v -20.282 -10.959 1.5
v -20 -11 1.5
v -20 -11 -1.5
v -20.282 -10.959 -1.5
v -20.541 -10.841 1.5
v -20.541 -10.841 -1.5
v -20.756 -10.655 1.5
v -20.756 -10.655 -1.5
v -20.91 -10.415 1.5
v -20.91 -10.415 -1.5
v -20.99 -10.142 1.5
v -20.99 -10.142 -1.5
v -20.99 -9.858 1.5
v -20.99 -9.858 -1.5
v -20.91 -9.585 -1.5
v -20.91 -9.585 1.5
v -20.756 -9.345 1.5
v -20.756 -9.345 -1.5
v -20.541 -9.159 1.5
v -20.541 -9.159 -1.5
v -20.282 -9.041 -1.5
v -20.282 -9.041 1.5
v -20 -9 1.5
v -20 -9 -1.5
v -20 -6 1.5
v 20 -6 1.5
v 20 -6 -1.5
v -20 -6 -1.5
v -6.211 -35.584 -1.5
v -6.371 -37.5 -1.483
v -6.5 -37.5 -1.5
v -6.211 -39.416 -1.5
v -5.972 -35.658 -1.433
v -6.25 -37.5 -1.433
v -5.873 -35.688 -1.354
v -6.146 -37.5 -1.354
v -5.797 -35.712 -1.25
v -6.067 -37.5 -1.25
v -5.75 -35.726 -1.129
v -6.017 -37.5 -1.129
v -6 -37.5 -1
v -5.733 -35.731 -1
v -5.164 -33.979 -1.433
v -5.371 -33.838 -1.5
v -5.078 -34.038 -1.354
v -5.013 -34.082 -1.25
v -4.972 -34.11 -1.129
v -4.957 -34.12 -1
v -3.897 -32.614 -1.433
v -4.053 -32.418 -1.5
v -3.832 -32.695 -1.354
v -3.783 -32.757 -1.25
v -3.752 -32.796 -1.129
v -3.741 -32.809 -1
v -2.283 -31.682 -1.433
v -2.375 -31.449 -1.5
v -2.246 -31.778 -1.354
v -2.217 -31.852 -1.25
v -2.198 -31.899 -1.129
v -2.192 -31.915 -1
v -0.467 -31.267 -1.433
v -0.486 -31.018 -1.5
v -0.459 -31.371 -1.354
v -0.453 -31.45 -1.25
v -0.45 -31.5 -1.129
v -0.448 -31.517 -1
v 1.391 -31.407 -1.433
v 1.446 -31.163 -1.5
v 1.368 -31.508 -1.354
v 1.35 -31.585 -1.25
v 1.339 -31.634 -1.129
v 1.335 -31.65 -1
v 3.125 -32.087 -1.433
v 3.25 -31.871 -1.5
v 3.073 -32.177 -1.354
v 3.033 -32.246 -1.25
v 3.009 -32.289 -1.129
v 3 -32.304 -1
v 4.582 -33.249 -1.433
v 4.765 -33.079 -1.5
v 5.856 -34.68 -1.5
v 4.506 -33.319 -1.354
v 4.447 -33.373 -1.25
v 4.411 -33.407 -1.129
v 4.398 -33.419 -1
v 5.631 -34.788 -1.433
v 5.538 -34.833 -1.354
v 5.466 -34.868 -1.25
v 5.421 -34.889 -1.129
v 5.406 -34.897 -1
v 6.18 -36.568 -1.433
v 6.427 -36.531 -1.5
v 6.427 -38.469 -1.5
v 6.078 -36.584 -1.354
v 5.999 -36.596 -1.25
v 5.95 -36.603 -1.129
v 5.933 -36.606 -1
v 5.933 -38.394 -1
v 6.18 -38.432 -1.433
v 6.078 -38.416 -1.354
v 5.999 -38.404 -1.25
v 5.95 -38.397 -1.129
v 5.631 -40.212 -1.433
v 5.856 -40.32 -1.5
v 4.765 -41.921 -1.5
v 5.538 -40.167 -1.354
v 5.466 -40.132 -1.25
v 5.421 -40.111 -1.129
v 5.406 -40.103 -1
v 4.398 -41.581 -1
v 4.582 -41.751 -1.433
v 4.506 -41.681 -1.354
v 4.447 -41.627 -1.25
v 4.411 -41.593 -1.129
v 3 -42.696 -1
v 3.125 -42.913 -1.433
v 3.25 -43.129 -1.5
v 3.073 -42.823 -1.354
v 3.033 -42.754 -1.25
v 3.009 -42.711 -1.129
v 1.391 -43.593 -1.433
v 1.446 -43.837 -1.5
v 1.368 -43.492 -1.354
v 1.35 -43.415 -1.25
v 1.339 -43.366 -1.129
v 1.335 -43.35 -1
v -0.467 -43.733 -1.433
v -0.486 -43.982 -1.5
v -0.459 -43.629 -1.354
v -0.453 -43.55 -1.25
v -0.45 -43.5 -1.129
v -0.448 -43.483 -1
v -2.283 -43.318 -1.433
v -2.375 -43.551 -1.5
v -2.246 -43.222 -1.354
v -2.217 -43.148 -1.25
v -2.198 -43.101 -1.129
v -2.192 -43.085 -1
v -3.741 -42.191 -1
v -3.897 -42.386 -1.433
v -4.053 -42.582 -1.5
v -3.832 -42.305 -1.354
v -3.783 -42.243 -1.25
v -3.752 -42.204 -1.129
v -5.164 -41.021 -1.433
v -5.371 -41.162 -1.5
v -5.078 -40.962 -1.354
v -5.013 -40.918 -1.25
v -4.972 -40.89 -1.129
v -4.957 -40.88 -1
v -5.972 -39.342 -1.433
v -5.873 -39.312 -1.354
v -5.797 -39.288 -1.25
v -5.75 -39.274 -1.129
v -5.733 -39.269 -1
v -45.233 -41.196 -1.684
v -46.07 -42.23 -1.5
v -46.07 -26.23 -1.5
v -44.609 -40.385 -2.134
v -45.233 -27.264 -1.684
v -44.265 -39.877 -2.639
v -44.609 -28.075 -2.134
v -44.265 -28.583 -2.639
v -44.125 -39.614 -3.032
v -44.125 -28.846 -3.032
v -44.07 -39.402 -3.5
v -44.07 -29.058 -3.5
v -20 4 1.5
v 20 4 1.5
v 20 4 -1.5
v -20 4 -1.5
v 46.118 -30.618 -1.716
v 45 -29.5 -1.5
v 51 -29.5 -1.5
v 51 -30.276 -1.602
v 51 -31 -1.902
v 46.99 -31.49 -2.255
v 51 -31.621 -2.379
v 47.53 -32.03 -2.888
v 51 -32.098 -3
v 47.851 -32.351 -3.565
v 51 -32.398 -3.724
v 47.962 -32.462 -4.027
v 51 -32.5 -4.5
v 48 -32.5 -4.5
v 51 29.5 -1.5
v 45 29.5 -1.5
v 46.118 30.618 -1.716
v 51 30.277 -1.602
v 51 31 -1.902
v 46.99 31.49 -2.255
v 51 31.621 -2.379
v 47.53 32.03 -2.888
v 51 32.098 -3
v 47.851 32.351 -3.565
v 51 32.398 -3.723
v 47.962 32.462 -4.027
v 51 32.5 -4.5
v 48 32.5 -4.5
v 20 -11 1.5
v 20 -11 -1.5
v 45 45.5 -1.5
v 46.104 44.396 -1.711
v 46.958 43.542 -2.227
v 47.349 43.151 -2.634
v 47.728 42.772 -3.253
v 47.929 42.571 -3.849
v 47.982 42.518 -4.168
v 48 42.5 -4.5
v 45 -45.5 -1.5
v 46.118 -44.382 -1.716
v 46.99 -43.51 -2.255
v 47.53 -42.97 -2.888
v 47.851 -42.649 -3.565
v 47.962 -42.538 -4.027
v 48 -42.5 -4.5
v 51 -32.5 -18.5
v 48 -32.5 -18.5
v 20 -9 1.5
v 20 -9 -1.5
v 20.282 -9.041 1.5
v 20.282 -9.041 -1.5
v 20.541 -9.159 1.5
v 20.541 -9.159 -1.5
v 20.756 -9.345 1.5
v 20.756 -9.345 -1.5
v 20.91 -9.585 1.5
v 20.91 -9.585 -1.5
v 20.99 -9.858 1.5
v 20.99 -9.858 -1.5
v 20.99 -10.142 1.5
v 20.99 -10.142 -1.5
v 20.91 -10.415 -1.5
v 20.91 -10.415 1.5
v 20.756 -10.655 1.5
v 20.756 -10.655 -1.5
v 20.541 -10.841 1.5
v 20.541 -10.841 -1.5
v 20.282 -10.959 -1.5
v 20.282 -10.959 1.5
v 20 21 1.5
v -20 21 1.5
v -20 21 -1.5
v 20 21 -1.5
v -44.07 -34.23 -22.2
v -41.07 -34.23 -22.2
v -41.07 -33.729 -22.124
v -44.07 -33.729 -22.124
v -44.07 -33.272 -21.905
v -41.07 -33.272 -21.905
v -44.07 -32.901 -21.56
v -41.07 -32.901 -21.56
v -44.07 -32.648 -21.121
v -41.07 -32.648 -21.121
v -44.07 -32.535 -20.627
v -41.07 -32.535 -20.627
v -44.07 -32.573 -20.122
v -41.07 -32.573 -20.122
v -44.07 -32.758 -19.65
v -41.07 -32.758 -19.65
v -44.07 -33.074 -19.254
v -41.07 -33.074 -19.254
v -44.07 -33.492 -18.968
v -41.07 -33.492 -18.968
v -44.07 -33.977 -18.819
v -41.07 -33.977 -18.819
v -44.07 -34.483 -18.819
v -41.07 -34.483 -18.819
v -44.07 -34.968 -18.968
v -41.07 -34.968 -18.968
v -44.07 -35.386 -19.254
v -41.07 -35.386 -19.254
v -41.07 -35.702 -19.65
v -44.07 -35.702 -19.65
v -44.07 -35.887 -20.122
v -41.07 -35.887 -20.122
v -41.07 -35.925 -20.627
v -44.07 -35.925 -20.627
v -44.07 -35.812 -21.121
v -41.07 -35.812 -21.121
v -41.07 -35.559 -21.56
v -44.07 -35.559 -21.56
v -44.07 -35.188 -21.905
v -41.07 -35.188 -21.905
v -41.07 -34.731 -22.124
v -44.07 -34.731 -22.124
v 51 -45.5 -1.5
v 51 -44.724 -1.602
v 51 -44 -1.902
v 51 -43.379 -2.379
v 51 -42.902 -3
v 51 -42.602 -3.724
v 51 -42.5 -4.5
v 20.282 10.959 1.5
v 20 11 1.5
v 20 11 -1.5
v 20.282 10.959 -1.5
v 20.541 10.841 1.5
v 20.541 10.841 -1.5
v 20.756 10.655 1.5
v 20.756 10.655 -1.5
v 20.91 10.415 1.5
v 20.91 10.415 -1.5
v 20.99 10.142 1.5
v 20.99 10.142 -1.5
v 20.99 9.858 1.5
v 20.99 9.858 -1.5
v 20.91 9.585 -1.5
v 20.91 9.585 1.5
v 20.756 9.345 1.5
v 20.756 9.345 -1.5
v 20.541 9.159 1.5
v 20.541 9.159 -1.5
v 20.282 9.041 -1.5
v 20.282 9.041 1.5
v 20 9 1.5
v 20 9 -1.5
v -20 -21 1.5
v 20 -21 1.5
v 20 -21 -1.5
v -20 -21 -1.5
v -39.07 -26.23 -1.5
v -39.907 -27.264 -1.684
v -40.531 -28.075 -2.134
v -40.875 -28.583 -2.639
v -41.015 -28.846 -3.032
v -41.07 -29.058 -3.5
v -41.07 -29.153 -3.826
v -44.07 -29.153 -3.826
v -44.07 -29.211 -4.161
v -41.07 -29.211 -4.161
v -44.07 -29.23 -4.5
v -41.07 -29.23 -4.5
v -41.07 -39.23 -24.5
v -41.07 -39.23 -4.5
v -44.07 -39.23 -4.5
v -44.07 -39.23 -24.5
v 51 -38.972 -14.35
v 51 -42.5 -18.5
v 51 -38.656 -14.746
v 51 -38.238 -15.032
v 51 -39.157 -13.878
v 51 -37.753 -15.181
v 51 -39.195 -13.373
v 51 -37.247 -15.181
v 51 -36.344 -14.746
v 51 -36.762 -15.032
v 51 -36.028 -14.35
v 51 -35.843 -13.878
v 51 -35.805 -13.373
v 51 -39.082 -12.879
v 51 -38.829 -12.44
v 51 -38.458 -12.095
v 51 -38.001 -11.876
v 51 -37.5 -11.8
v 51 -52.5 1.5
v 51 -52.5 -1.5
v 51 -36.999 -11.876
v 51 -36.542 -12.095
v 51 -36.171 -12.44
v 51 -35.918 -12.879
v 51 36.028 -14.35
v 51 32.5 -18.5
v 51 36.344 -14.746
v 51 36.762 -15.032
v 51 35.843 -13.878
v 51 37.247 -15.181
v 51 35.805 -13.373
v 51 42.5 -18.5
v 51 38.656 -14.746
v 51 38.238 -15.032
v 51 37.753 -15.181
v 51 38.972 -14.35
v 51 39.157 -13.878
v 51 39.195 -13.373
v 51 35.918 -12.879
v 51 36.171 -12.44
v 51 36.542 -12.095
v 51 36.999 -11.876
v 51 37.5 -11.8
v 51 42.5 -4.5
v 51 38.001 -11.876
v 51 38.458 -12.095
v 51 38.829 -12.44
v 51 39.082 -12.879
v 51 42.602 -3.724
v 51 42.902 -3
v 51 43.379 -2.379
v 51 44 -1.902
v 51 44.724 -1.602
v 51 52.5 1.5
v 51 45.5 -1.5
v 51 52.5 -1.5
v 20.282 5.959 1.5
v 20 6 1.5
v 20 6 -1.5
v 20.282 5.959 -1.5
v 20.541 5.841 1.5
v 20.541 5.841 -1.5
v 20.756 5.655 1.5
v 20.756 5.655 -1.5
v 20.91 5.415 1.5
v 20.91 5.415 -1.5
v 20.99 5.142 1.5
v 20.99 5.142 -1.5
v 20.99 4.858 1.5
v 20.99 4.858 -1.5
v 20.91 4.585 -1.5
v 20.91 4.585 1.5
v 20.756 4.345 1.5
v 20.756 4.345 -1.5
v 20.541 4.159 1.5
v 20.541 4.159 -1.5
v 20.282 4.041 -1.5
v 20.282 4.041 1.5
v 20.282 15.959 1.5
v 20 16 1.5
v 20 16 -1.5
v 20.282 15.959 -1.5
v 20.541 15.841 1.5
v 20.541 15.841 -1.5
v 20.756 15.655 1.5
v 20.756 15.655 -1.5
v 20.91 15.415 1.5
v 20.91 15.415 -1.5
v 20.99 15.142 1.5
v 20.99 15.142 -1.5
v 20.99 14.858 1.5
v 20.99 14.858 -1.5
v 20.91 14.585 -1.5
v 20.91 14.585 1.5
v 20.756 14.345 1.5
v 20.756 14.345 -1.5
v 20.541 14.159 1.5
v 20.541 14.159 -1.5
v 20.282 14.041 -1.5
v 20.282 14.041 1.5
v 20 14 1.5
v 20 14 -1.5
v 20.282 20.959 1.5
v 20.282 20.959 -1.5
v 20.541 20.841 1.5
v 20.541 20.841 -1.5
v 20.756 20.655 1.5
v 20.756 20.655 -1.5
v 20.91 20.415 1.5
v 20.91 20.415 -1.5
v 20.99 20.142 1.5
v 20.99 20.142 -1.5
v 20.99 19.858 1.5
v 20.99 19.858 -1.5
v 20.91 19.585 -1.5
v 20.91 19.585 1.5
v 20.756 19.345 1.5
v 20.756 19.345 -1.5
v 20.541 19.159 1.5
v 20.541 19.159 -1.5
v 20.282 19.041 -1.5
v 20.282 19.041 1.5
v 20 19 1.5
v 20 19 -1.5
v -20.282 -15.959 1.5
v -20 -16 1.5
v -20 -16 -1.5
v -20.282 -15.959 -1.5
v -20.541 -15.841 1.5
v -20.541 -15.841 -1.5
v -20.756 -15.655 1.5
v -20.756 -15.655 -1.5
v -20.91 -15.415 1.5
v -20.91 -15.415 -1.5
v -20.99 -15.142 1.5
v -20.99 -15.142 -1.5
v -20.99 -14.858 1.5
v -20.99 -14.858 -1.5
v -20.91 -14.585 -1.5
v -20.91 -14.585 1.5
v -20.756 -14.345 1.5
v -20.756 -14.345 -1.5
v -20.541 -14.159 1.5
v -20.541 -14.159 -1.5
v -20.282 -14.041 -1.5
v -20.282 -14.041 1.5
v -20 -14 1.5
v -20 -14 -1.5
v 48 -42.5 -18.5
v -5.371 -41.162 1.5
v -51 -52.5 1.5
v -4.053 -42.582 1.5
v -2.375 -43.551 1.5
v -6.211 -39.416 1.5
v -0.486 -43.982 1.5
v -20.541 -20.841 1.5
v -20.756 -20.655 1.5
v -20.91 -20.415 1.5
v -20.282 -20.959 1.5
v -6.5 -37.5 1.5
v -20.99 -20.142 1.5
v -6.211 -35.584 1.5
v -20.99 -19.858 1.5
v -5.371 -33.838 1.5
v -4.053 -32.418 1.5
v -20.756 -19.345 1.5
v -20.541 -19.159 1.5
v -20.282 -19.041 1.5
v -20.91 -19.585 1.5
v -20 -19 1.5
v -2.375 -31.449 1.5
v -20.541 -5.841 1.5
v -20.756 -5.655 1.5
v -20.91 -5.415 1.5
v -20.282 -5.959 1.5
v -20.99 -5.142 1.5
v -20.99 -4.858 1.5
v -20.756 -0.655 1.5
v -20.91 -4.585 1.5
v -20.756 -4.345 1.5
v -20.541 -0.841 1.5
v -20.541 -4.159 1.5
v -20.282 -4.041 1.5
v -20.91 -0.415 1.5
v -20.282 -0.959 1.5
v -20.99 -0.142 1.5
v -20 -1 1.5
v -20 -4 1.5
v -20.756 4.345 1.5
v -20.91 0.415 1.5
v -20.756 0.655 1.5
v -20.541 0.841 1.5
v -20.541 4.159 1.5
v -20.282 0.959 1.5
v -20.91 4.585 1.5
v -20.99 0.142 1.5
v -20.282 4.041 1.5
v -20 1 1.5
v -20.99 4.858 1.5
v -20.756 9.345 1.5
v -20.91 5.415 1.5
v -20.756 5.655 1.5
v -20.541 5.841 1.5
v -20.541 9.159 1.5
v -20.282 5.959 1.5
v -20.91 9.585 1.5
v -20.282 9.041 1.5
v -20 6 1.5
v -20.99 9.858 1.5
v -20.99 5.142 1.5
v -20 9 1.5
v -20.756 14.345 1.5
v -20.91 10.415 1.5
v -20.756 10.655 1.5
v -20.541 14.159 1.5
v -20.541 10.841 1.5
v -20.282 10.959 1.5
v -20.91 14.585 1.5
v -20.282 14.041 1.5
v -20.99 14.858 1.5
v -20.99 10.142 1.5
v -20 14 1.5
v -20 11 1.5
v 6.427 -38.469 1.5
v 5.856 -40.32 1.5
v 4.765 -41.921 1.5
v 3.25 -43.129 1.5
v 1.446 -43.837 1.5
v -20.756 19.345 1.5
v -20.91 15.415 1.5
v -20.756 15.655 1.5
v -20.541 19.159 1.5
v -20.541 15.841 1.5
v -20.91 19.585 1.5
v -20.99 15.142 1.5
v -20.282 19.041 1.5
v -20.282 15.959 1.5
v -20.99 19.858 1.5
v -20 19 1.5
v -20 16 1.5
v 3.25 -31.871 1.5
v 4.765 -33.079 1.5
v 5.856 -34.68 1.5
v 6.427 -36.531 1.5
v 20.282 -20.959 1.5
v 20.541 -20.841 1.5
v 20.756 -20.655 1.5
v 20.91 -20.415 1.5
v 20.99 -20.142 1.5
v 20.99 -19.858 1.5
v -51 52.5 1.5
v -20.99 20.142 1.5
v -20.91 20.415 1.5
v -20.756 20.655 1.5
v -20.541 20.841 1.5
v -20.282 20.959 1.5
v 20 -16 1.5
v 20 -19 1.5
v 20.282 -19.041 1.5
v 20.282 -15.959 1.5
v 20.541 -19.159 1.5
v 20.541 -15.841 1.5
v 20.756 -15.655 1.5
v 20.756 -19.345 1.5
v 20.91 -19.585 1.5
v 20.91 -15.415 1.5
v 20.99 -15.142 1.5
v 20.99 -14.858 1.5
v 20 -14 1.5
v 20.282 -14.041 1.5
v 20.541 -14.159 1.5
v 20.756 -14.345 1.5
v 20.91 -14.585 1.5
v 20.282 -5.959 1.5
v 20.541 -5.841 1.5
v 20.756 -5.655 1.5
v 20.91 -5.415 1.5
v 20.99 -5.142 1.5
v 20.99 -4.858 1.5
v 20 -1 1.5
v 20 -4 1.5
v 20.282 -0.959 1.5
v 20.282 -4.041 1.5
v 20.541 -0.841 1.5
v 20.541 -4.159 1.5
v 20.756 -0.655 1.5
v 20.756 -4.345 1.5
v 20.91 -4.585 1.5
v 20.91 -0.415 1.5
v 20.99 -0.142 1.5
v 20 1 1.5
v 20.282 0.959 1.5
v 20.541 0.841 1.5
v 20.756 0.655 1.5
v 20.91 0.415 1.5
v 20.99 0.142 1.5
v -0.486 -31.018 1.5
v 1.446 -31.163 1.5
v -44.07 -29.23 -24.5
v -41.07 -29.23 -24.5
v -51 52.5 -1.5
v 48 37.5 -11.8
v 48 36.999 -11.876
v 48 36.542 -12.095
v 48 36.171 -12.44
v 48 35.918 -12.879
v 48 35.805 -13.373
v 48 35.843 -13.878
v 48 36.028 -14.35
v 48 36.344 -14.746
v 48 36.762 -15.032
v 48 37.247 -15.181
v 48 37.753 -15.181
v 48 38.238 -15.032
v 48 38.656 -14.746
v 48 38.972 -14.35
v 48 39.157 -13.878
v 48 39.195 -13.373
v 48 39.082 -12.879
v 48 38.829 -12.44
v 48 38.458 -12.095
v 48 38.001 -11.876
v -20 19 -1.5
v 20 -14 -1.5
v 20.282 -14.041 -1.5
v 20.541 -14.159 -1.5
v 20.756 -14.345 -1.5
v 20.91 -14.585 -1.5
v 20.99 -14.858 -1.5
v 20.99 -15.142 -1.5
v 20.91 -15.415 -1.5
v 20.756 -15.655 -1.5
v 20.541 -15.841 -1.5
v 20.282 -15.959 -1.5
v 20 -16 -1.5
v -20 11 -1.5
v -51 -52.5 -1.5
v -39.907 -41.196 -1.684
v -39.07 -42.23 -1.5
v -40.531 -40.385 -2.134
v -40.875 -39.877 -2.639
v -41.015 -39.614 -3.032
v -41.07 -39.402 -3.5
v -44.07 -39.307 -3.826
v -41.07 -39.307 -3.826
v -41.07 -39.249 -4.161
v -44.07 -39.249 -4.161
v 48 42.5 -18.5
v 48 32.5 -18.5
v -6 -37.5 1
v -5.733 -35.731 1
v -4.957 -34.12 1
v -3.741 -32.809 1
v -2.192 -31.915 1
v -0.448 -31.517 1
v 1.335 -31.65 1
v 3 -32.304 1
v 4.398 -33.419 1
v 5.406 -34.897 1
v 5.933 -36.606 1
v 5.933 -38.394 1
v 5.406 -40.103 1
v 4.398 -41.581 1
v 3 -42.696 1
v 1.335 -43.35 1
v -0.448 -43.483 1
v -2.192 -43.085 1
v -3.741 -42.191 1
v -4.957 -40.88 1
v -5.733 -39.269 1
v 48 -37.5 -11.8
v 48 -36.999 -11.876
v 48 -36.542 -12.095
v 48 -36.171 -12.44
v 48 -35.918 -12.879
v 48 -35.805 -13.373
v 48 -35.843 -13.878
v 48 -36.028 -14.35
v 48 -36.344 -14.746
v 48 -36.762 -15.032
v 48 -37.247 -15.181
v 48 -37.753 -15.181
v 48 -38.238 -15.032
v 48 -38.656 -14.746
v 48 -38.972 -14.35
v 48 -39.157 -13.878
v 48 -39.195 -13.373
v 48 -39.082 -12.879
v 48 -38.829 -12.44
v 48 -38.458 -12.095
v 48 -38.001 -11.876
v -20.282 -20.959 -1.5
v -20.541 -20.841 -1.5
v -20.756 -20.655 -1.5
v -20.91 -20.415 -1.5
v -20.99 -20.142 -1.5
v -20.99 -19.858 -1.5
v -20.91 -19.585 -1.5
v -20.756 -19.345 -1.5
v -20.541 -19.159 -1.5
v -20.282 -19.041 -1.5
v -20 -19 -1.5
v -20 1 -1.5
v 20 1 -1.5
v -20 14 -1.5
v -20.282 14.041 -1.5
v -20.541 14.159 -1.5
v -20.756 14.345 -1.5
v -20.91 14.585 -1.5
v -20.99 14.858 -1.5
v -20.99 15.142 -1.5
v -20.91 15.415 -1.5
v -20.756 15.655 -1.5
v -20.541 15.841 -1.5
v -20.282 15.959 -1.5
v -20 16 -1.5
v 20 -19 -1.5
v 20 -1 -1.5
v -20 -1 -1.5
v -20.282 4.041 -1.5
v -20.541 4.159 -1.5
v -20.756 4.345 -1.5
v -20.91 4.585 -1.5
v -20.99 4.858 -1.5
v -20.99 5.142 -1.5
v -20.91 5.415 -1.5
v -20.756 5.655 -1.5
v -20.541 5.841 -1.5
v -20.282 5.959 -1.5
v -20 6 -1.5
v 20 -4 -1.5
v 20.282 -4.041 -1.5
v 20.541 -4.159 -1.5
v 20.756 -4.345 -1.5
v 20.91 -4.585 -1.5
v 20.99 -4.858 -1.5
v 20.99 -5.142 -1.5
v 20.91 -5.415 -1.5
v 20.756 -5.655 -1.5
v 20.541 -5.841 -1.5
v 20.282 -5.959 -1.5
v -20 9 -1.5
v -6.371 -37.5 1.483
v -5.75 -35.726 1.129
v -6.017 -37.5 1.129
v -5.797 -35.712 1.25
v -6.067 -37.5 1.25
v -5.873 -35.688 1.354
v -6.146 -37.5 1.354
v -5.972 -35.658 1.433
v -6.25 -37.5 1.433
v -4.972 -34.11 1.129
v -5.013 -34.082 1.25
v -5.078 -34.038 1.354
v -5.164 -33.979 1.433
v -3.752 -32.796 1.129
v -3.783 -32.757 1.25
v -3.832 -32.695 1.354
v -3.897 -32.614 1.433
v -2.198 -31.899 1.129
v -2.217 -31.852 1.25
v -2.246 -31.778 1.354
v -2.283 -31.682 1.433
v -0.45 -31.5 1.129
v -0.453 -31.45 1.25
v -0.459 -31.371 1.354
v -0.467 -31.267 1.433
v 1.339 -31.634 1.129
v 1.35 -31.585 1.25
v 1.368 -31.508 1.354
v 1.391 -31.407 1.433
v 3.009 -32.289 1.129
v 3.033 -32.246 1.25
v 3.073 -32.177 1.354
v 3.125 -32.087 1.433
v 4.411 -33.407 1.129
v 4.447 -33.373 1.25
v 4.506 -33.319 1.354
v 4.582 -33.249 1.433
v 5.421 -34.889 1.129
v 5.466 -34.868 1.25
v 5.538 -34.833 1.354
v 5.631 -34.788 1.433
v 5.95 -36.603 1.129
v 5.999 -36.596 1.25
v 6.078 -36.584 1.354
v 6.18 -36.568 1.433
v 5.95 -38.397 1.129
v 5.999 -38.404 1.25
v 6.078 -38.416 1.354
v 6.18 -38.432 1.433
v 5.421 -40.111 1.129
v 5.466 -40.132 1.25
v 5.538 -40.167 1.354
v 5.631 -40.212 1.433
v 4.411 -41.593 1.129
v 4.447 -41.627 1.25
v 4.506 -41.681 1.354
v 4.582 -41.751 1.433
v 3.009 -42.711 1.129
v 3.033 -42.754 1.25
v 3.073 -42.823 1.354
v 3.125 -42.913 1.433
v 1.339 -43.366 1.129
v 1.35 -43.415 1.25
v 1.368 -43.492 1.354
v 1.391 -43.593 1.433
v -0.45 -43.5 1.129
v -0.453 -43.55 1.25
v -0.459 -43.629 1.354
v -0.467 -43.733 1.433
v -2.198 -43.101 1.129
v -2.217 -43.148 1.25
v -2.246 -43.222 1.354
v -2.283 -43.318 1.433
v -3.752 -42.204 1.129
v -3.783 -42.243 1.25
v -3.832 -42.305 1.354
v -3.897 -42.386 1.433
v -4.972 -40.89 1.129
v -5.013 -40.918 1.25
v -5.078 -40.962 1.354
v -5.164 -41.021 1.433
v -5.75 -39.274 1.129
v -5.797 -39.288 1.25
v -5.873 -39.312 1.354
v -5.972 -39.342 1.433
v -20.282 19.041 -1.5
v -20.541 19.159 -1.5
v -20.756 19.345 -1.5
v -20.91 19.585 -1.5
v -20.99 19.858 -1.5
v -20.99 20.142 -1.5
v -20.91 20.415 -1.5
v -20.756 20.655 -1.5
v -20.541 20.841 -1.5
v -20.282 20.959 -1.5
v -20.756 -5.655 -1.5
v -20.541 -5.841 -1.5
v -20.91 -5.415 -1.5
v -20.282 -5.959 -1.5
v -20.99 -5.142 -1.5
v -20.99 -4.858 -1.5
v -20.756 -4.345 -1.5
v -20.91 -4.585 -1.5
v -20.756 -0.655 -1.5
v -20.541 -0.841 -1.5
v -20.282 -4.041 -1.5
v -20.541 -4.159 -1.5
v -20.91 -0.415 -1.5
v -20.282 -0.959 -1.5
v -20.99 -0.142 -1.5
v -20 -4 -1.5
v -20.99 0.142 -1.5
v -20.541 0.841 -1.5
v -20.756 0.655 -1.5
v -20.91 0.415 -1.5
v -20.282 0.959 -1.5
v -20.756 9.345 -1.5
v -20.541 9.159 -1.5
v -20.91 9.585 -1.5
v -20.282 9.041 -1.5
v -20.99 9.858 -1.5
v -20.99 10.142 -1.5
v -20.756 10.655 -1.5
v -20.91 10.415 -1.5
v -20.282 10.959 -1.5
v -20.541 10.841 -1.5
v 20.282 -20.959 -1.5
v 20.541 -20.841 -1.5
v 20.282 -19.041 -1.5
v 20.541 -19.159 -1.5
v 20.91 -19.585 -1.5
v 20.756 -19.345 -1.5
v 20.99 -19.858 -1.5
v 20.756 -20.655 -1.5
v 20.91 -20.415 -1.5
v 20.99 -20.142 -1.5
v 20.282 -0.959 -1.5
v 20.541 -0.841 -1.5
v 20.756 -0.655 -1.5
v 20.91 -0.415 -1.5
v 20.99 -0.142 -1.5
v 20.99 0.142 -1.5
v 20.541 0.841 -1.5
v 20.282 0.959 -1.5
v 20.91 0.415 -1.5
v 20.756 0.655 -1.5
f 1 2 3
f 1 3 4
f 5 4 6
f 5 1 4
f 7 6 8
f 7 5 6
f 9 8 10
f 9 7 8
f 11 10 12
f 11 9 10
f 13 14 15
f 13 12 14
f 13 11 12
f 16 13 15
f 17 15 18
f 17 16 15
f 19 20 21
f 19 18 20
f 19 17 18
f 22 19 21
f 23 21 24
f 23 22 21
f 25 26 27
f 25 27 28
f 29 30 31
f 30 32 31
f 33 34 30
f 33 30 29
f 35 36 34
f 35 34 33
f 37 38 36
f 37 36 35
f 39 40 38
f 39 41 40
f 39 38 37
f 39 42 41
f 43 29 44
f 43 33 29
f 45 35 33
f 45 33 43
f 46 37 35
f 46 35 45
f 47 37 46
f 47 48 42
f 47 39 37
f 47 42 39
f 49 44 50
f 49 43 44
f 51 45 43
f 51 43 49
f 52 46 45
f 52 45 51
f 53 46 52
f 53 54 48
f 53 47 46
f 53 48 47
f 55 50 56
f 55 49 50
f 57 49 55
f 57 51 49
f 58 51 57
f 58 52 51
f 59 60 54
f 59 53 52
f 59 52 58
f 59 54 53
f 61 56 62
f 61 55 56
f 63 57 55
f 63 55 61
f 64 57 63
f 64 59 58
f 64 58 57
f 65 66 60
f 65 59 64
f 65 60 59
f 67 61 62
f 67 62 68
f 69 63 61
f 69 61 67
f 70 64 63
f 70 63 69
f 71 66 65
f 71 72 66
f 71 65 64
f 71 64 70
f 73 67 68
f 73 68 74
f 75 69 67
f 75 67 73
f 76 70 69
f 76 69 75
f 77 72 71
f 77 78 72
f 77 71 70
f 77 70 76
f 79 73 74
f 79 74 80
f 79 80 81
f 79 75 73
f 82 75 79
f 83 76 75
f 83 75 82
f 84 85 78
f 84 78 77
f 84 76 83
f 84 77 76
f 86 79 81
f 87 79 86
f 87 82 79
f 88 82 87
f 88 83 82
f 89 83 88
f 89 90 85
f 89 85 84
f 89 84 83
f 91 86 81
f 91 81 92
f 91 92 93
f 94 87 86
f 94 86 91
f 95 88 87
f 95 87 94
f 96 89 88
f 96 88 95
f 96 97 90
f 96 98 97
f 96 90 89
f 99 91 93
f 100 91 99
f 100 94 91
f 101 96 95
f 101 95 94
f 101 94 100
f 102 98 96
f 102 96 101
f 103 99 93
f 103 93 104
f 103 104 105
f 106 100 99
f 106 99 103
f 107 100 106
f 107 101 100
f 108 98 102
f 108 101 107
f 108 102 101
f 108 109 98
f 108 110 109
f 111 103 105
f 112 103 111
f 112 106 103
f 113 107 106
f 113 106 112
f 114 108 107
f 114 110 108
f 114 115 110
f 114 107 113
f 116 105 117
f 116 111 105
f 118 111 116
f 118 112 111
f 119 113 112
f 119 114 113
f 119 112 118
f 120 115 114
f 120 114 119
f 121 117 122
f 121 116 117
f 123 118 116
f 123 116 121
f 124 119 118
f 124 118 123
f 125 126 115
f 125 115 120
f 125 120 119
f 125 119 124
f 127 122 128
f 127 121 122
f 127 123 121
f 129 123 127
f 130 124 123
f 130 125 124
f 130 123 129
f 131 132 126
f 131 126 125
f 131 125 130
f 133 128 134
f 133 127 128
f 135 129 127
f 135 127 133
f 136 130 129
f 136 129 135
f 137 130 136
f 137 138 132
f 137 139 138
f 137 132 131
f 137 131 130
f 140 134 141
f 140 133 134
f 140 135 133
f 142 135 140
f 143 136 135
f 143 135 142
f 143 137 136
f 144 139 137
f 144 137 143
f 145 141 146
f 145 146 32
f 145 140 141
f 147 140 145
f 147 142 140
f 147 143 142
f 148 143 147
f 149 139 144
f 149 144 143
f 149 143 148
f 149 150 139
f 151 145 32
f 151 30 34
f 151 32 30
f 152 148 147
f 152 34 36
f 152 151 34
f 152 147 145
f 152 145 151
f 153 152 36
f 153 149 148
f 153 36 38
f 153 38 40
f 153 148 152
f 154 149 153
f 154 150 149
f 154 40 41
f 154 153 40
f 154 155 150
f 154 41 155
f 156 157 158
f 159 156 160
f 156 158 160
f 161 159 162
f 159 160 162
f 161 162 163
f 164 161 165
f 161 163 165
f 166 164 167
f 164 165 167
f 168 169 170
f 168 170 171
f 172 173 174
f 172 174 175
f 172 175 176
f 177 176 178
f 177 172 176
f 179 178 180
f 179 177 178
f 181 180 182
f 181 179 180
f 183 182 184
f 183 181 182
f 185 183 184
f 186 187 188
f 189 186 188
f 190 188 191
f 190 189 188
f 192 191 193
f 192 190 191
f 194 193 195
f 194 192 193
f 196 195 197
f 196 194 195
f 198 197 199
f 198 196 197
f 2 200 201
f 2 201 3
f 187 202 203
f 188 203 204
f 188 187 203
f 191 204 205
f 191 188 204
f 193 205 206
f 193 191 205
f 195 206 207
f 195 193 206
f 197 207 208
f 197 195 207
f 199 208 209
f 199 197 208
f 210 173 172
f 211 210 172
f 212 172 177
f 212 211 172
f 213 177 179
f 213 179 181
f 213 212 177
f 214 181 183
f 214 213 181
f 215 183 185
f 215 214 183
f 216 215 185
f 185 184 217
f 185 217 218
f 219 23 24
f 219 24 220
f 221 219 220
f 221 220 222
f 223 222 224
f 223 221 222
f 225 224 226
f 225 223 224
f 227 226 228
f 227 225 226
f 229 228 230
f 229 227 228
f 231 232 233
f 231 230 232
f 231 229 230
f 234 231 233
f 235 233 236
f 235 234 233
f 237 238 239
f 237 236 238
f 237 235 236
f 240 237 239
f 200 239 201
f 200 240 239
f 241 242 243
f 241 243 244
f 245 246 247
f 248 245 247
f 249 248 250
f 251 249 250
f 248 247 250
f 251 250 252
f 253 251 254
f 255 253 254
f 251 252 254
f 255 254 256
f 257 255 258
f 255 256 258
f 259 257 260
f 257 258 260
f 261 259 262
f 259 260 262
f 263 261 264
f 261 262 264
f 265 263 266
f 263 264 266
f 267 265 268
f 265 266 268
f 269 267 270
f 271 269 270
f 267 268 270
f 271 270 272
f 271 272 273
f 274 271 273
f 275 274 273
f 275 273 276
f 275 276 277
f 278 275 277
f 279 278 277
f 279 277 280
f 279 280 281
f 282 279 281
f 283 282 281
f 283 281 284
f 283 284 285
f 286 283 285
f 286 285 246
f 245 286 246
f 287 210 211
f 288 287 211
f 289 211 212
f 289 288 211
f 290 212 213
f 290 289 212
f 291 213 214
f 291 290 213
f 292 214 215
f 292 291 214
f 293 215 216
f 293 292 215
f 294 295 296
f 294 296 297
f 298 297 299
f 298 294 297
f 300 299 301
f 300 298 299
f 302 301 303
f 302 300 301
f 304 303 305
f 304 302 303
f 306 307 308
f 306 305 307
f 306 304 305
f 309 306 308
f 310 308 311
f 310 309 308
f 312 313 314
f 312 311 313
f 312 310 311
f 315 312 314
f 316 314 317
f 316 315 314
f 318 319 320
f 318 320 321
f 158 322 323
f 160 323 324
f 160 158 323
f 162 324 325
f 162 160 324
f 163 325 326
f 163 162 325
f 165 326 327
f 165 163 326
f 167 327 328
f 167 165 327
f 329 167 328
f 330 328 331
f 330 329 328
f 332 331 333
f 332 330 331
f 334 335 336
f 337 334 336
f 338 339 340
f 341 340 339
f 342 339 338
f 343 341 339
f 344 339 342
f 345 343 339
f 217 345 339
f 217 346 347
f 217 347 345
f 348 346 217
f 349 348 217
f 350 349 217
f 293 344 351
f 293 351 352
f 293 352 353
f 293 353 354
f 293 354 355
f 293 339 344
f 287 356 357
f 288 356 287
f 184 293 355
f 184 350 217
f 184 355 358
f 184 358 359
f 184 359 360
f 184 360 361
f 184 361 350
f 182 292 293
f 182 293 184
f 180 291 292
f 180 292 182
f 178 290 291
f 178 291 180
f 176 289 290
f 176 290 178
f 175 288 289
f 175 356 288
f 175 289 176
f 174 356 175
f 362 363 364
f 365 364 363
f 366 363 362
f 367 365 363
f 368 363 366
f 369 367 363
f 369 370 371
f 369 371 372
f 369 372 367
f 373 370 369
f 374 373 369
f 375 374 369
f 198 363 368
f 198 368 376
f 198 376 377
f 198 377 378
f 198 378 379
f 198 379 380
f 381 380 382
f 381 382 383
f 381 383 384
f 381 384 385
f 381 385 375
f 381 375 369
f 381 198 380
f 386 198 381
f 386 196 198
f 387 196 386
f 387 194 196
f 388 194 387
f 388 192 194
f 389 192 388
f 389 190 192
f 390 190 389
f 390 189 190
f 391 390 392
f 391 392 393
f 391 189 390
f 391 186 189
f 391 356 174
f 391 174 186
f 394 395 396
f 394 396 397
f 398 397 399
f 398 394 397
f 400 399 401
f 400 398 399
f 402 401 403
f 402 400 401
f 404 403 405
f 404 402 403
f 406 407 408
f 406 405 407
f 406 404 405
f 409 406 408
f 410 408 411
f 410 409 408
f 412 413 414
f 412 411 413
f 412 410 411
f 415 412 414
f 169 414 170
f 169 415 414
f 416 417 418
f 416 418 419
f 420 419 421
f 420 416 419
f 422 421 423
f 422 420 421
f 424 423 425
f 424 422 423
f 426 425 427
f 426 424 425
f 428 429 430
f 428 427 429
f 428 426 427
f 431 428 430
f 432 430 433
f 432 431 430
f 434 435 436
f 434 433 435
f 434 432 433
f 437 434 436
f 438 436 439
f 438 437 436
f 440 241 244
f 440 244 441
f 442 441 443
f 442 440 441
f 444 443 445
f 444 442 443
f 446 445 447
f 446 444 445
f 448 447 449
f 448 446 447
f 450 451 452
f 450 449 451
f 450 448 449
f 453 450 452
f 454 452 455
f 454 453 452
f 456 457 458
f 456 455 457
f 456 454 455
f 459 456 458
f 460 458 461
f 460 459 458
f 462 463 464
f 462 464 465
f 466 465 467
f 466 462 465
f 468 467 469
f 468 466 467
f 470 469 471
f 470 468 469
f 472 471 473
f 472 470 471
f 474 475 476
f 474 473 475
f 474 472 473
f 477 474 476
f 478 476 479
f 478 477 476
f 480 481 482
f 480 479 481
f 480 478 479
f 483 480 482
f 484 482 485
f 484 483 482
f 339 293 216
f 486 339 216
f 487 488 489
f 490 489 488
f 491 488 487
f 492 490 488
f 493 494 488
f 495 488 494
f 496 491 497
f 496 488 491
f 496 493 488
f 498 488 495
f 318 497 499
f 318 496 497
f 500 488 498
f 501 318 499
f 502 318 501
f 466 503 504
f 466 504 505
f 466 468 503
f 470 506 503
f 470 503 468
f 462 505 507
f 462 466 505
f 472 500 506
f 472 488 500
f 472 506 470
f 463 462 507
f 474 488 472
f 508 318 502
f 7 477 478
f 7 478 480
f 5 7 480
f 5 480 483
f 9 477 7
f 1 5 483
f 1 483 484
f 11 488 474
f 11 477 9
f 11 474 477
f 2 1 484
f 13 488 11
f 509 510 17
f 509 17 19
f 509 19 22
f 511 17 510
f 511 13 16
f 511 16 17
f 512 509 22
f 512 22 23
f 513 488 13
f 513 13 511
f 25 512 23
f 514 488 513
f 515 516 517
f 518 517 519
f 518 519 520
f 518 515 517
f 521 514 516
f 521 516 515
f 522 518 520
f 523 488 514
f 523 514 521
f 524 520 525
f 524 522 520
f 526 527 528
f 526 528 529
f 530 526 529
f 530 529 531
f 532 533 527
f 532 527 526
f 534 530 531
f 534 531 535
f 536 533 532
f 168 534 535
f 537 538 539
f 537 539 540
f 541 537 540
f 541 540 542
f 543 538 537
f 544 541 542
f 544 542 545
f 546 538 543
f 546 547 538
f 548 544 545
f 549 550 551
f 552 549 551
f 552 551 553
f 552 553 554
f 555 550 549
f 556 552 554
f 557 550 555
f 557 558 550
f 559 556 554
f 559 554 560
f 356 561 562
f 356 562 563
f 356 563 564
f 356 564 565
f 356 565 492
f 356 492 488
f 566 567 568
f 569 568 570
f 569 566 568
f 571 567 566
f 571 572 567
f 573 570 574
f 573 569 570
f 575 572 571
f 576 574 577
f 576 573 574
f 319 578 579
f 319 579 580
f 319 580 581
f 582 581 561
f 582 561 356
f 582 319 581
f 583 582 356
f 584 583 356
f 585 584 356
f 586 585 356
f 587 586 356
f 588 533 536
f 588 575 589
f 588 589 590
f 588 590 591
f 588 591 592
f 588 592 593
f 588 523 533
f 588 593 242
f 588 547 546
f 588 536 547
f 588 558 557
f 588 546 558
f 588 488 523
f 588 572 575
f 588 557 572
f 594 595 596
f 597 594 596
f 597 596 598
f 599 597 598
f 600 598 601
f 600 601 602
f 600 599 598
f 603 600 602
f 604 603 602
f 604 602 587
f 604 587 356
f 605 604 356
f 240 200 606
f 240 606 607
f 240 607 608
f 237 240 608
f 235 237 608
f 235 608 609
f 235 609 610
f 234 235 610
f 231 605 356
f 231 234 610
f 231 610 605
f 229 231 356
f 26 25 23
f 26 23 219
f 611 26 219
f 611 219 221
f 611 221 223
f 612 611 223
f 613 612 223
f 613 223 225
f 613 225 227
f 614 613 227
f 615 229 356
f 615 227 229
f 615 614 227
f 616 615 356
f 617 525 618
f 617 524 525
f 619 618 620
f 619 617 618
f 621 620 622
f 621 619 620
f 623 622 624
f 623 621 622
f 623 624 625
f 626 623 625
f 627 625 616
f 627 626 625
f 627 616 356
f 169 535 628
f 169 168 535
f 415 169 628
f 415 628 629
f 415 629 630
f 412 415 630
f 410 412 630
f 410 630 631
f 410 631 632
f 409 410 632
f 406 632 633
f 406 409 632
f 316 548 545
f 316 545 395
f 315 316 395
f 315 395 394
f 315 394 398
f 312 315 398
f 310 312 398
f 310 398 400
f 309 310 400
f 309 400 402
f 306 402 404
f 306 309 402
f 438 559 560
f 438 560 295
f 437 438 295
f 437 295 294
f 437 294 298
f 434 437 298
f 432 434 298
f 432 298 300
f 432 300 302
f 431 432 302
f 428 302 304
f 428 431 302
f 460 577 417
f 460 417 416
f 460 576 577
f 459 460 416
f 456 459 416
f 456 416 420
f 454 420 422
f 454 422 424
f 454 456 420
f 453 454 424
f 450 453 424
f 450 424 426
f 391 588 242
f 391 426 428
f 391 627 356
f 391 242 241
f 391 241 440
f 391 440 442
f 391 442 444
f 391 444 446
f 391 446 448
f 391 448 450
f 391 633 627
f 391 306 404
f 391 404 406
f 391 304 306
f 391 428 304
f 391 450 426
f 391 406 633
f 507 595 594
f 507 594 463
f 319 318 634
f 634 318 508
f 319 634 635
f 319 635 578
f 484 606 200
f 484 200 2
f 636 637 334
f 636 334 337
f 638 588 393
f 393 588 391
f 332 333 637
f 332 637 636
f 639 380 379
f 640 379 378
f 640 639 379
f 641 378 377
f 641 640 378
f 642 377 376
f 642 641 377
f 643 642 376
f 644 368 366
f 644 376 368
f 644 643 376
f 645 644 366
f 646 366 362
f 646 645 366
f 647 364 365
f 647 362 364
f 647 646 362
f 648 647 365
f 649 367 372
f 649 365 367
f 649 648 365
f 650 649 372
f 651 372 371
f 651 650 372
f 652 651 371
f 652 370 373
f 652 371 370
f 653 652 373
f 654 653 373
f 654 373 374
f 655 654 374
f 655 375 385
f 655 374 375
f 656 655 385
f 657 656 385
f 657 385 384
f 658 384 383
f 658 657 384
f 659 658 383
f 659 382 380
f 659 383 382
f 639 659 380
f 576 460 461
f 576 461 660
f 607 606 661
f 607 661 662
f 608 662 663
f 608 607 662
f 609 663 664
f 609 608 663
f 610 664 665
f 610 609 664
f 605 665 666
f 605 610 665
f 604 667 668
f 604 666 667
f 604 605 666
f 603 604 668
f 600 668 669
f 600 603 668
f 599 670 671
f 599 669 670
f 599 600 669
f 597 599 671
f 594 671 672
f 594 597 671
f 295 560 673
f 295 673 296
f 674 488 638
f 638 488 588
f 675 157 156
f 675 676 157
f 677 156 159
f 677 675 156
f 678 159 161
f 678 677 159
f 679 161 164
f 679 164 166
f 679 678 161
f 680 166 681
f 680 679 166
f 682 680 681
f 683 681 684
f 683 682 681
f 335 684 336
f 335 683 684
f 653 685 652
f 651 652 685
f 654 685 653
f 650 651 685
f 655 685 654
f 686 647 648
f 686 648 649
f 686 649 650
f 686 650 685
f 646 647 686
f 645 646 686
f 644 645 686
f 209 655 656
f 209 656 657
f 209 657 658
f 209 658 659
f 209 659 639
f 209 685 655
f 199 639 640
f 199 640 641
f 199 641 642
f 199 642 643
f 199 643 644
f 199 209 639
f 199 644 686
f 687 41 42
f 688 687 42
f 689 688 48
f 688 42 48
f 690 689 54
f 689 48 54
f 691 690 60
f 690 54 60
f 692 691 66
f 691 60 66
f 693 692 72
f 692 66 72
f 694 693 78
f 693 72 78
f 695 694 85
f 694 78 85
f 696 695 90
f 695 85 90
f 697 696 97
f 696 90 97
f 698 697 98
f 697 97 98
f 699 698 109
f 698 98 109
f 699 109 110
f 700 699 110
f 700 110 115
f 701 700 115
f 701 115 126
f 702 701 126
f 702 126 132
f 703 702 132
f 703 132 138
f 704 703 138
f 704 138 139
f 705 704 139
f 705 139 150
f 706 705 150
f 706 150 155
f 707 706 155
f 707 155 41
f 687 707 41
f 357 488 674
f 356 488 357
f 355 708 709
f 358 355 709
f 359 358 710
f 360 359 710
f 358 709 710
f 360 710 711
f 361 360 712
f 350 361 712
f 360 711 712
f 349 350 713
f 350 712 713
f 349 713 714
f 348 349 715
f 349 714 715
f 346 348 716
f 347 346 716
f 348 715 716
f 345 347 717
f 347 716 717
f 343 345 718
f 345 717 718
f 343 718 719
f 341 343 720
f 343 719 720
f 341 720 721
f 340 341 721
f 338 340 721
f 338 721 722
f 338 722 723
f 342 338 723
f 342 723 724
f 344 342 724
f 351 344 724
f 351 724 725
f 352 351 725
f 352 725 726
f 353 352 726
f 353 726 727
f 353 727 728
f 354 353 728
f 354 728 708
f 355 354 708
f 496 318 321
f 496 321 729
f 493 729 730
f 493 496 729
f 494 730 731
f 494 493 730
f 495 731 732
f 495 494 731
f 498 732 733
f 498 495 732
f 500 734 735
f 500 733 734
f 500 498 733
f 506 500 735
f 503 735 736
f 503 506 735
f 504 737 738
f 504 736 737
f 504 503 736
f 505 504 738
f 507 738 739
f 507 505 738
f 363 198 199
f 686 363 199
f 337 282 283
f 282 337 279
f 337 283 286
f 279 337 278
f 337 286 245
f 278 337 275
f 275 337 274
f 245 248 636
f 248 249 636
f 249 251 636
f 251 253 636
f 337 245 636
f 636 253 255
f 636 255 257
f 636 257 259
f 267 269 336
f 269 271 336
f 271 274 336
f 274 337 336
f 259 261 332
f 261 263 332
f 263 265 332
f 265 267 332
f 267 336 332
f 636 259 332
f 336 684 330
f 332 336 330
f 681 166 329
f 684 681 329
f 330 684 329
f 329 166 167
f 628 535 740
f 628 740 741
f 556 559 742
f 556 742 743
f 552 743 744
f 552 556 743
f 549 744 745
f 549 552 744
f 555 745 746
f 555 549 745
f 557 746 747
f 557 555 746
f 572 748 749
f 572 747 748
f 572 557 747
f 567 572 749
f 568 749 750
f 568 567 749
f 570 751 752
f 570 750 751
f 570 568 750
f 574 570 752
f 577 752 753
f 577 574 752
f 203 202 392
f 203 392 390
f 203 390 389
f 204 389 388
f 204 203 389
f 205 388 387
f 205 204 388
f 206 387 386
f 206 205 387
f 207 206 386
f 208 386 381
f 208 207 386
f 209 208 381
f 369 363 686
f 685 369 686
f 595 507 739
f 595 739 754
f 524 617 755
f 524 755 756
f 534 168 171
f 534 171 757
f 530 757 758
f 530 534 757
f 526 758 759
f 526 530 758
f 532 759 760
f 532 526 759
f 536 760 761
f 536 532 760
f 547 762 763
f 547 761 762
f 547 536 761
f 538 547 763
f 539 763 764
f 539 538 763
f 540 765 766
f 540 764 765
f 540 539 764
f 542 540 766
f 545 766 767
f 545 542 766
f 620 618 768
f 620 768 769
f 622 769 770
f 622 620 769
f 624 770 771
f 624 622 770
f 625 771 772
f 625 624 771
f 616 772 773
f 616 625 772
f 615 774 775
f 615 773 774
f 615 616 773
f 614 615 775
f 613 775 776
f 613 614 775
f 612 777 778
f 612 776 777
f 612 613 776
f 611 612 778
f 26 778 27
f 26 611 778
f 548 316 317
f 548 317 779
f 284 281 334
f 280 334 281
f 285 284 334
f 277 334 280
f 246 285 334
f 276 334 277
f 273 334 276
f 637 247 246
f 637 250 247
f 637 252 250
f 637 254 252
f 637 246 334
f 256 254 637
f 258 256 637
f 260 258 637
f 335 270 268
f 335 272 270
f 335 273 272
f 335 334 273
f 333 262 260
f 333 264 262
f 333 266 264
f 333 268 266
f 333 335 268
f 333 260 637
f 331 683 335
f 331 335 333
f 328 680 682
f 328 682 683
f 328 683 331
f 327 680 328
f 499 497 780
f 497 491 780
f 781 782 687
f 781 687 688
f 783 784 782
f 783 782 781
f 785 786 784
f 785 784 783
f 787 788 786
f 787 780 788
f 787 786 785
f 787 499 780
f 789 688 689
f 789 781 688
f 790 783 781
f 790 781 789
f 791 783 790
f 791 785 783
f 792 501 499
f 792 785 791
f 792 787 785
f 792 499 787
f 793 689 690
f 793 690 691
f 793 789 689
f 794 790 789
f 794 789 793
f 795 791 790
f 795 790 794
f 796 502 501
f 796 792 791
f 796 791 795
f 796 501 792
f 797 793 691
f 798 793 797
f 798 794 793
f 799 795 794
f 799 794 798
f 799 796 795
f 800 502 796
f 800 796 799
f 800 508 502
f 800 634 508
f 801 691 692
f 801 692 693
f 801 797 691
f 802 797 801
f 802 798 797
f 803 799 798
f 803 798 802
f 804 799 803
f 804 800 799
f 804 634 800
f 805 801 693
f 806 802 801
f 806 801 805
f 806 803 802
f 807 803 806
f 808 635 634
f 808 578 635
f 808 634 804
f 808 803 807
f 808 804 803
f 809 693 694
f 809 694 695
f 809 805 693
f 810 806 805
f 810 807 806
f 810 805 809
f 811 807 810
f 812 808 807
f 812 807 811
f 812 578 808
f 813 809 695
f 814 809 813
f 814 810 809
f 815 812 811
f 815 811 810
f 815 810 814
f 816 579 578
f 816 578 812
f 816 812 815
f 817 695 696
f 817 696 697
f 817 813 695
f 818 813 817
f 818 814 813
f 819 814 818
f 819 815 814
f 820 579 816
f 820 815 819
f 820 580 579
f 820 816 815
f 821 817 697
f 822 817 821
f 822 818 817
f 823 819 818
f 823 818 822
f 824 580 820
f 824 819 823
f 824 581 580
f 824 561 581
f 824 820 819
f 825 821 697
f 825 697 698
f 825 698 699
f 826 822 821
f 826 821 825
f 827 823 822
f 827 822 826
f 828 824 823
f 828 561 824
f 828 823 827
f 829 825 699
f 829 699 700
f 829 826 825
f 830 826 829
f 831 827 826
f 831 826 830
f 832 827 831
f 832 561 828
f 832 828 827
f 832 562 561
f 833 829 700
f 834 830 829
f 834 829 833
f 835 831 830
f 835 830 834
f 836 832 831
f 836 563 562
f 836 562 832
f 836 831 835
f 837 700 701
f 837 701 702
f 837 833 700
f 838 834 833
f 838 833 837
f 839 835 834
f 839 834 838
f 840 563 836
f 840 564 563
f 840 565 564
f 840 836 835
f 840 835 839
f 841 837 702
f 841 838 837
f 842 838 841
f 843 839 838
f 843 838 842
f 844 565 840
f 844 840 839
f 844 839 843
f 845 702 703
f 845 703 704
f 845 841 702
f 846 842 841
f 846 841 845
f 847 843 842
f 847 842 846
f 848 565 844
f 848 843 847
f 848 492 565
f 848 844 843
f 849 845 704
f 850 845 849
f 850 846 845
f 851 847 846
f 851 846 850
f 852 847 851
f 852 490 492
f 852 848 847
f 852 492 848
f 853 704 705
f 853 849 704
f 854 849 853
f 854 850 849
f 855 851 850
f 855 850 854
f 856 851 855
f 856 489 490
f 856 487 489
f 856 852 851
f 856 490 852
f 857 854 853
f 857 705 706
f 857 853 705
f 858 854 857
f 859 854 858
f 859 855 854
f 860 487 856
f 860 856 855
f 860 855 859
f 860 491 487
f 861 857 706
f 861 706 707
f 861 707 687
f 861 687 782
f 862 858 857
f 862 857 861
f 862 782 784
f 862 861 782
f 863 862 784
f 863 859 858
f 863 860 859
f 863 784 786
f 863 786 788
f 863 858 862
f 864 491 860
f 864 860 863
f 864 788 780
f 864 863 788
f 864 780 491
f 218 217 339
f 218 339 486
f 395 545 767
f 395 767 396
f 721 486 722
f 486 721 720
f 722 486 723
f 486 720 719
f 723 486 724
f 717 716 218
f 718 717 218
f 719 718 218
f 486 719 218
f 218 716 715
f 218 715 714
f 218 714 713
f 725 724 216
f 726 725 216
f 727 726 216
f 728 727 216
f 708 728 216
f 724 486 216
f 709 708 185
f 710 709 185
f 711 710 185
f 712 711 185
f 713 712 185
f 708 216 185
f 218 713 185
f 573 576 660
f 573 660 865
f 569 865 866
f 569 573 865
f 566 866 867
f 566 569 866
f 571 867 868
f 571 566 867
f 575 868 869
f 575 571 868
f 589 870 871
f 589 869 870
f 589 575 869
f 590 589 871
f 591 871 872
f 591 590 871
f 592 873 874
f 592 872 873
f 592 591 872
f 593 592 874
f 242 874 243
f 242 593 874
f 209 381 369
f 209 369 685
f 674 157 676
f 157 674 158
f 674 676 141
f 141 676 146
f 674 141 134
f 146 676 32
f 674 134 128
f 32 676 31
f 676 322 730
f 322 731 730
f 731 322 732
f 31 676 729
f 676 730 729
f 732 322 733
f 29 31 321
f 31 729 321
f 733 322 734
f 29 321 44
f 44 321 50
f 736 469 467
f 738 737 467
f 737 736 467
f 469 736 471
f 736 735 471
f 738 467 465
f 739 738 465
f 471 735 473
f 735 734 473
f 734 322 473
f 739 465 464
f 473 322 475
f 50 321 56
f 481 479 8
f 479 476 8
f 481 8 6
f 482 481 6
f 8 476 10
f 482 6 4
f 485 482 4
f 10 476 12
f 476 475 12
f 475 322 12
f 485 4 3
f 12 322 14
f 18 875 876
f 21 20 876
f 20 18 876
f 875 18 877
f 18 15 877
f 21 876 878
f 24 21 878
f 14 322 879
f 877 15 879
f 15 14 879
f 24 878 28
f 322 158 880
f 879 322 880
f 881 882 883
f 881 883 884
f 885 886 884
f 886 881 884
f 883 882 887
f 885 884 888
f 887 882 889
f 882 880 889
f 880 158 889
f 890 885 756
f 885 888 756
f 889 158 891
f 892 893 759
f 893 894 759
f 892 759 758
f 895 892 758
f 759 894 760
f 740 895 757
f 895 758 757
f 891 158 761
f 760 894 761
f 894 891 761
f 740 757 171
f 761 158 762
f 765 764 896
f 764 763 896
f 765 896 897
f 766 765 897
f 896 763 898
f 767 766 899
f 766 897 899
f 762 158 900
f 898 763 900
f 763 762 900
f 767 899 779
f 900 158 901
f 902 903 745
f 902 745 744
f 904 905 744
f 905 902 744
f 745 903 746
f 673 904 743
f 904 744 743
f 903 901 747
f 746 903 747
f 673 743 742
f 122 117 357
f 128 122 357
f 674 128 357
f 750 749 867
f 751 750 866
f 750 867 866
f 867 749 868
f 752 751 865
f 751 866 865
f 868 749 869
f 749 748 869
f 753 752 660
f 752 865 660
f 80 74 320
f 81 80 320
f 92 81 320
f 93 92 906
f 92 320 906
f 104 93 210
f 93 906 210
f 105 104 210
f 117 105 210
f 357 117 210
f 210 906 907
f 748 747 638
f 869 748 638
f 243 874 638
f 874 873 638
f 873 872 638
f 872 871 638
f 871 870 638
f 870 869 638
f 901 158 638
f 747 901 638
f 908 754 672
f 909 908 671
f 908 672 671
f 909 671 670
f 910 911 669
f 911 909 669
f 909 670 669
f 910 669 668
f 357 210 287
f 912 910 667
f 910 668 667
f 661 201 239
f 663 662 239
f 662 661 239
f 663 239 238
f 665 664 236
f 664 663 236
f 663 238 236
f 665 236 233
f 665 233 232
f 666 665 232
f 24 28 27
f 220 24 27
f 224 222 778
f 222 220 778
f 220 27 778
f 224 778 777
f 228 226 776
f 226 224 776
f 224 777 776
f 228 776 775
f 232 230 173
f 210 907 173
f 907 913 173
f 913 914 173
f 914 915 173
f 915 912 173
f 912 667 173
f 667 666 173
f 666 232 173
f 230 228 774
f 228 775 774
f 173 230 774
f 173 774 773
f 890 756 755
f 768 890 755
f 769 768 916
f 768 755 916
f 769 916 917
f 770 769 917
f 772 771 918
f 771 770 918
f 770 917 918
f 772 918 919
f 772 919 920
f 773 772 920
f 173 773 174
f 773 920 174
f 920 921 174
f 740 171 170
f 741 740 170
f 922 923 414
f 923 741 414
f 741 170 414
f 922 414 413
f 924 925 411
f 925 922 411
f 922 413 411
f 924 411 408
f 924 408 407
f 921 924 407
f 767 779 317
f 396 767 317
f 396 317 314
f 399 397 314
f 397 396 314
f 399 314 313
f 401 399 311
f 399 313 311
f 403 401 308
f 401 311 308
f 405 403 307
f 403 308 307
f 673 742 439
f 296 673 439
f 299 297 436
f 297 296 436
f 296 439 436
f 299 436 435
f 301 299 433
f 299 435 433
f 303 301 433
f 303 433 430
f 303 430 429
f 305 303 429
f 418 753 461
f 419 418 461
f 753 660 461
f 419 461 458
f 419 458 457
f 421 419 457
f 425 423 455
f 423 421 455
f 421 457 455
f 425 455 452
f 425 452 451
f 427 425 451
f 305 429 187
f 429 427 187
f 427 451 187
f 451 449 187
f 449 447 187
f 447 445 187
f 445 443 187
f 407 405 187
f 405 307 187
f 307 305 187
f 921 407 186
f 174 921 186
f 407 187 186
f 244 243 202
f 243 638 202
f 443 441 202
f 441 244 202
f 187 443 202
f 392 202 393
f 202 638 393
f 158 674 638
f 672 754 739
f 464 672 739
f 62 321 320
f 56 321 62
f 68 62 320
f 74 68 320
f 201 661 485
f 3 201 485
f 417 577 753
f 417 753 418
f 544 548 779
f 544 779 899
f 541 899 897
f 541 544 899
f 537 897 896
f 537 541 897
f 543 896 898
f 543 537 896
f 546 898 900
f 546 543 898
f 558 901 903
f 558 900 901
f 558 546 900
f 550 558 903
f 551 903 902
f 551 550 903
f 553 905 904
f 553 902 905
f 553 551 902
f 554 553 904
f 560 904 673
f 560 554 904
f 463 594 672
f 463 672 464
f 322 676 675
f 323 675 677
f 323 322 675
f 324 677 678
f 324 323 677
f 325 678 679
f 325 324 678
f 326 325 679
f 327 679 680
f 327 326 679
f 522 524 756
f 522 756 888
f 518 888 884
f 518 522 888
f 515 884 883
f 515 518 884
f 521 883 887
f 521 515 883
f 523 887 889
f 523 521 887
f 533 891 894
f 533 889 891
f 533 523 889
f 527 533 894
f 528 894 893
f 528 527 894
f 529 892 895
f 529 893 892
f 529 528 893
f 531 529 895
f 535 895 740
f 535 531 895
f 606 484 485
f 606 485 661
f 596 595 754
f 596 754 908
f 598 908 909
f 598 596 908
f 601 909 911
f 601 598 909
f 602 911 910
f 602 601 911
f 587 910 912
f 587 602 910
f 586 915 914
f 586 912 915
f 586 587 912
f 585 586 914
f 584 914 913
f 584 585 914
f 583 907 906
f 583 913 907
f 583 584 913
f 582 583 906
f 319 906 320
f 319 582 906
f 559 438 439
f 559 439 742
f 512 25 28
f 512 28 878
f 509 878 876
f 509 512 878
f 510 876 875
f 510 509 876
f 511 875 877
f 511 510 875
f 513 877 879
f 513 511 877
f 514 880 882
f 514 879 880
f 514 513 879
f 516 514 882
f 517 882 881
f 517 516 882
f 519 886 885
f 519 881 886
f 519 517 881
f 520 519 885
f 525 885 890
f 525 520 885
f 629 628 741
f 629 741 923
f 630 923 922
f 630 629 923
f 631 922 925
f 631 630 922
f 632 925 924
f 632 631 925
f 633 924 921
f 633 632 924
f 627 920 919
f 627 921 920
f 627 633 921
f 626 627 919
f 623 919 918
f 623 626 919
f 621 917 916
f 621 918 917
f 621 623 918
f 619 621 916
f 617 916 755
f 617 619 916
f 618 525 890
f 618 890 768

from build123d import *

# Parameters (mm, degrees)
SKETCH1_W                = 102
SKETCH1_H                = 105
BOSS_EXTRUDE1_DEPTH      = 1.5
SKETCH2_W                = 3
SKETCH2_H                = 10
BOSS_EXTRUDE2_DEPTH      = 23
FILLET1_R                = 2
M3_CLEARANCE_HOLE1_D     = 3.4
SKETCH6_W                = 3
SKETCH6_H                = 10
BOSS_EXTRUDE3_DEPTH      = 17
M3_CLEARANCE_HOLE2_D     = 3.4
M3_CLEARANCE_HOLE2_DEPTH = 3
CUT_EXTRUDE1_DEPTH       = 10
SKETCH10_R               = 6
CUT_EXTRUDE2_DEPTH       = 10
FILLET2_R                = 3
FILLET3_R                = 0.5


with BuildPart() as part:
    # Sketch1 → Boss-Extrude1 (new, symmetric)
    with BuildSketch(Plane.XY):
        Rectangle(SKETCH1_W, SKETCH1_H)
    extrude(amount=BOSS_EXTRUDE1_DEPTH, both=True)

    # Sketch2 → Boss-Extrude2 (add)
    with BuildSketch(Plane(origin=(0, 0, -1.5), x_dir=(-1, 0, 0), z_dir=(0, 0, -1))):
        with Locations((42.57, -34.23)):
            Rectangle(SKETCH2_W, SKETCH2_H)
    extrude(amount=BOSS_EXTRUDE2_DEPTH)

    # Fillet1
    fillet1_edges = [part.edges().sort_by_distance(p)[0] for p in [
        (-44.07, -34.23, -1.5),
        (-41.07, -34.23, -1.5),
    ]]
    fillet(fillet1_edges, radius=FILLET1_R)

    # M3 Clearance Hole1 (through all)
    with Locations(Plane.ZY.offset(44.07)):
        with Locations((-20.5, -34.23)):
            Hole(M3_CLEARANCE_HOLE1_D / 2)

    # Sketch6 → Boss-Extrude3 (add)
    with BuildSketch(Plane(origin=(0, 0, -1.5), x_dir=(-1, 0, 0), z_dir=(0, 0, -1))):
        with Locations((-49.5, -37.5)):
            Rectangle(SKETCH6_W, SKETCH6_H)
    boss_extrude3 = extrude(amount=BOSS_EXTRUDE3_DEPTH)

    # M3 Clearance Hole2
    with Locations(Plane(origin=(51, 0, 0), x_dir=(0, 0, -1), z_dir=(1, 0, 0))):
        with Locations((13.5, -37.5)):
            m3_clearance_hole2 = Hole(M3_CLEARANCE_HOLE2_D / 2, depth=M3_CLEARANCE_HOLE2_DEPTH)

    # Sketch9 → Cut-Extrude1 (cut)
    with BuildSketch(Plane.XY.offset(1.5)):
        with BuildLine():
            Line((-20, 6), (20, 6))
            ThreePointArc((20, 6), (21, 5), (20, 4))
            Line((20, 4), (-20, 4))
            ThreePointArc((-20, 4), (-21, 5), (-20, 6))
        make_face()
        with BuildLine():
            Line((-20, 1), (20, 1))
            ThreePointArc((20, 1), (21, 0), (20, -1))
            Line((20, -1), (-20, -1))
            ThreePointArc((-20, -1), (-21, 0), (-20, 1))
        make_face()
        with BuildLine():
            Line((-20, -4), (20, -4))
            ThreePointArc((20, -4), (21, -5), (20, -6))
            Line((20, -6), (-20, -6))
            ThreePointArc((-20, -6), (-21, -5), (-20, -4))
        make_face()
        with BuildLine():
            Line((-20, 11), (20, 11))
            ThreePointArc((20, 11), (21, 10), (20, 9))
            Line((20, 9), (-20, 9))
            ThreePointArc((-20, 9), (-21, 10), (-20, 11))
        make_face()
        with BuildLine():
            Line((-20, -9), (20, -9))
            ThreePointArc((20, -9), (21, -10), (20, -11))
            Line((20, -11), (-20, -11))
            ThreePointArc((-20, -11), (-21, -10), (-20, -9))
        make_face()
        with BuildLine():
            Line((-20, 16), (20, 16))
            ThreePointArc((20, 16), (21, 15), (20, 14))
            Line((20, 14), (-20, 14))
            ThreePointArc((-20, 14), (-21, 15), (-20, 16))
        make_face()
        with BuildLine():
            Line((-20, 21), (20, 21))
            ThreePointArc((20, 21), (21, 20), (20, 19))
            Line((20, 19), (-20, 19))
            ThreePointArc((-20, 19), (-21, 20), (-20, 21))
        make_face()
        with BuildLine():
            Line((-20, -14), (20, -14))
            ThreePointArc((20, -14), (21, -15), (20, -16))
            Line((20, -16), (-20, -16))
            ThreePointArc((-20, -16), (-21, -15), (-20, -14))
        make_face()
        with BuildLine():
            Line((-20, -19), (20, -19))
            ThreePointArc((20, -19), (21, -20), (20, -21))
            Line((20, -21), (-20, -21))
            ThreePointArc((-20, -21), (-21, -20), (-20, -19))
        make_face()
    extrude(amount=-CUT_EXTRUDE1_DEPTH, mode=Mode.SUBTRACT)

    # Sketch10 → Cut-Extrude2 (cut)
    with BuildSketch(Plane(origin=(0, 0, -1.5), x_dir=(-1, 0, 0), z_dir=(0, 0, -1))):
        with Locations((0, -37.5)):
            Circle(SKETCH10_R)
    extrude(amount=-CUT_EXTRUDE2_DEPTH, mode=Mode.SUBTRACT)

    # Mirror1: Boss-Extrude3, M3 Clearance Hole2 across plane
    add(boss_extrude3.mirror(Plane.ZX))
    add(m3_clearance_hole2.mirror(Plane.ZX), mode=Mode.SUBTRACT)

    # Fillet2
    fillet2_edges = [part.edges().sort_by_distance(p)[0] for p in [
        (49.5, -32.5, -1.5),
    ]]
    fillet(fillet2_edges, radius=FILLET2_R)
    fillet2_2_edges = [part.edges().sort_by_distance(p)[0] for p in [
        (48, -37.5, -1.5),
    ]]
    fillet(fillet2_2_edges, radius=FILLET2_R)
    fillet2_3_edges = [part.edges().sort_by_distance(p)[0] for p in [
        (49.5, -42.5, -1.5),
    ]]
    fillet(fillet2_3_edges, radius=FILLET2_R)
    fillet2_4_edges = [part.edges().sort_by_distance(p)[0] for p in [
        (49.5, 42.5, -1.5),
    ]]
    fillet(fillet2_4_edges, radius=FILLET2_R)
    fillet2_5_edges = [part.edges().sort_by_distance(p)[0] for p in [
        (48, 37.5, -1.5),
    ]]
    fillet(fillet2_5_edges, radius=FILLET2_R - 0.0001)  # a hair under: the kernel refuses the full size
    fillet2_6_edges = [part.edges().sort_by_distance(p)[0] for p in [
        (49.5, 32.5, -1.5),
    ]]
    fillet(fillet2_6_edges, radius=FILLET2_R - 0.0001)  # a hair under: the kernel refuses the full size
    fillet2_7_edges = [part.edges().sort_by_distance(p)[0] for p in [
        (-42.57, -29.23, -1.5),
    ]]
    fillet(fillet2_7_edges, radius=FILLET2_R)
    fillet2_8_edges = [part.edges().sort_by_distance(p)[0] for p in [
        (-42.57, -39.23, -1.5),
    ]]
    fillet(fillet2_8_edges, radius=FILLET2_R)

    # Fillet3
    fillet3_edges = [part.edges().sort_by_distance(p)[0] for p in [
        (6, -37.5, 1.5),
        (6, -37.5, -1.5),
    ]]
    fillet(fillet3_edges, radius=FILLET3_R)


solid = part.part
